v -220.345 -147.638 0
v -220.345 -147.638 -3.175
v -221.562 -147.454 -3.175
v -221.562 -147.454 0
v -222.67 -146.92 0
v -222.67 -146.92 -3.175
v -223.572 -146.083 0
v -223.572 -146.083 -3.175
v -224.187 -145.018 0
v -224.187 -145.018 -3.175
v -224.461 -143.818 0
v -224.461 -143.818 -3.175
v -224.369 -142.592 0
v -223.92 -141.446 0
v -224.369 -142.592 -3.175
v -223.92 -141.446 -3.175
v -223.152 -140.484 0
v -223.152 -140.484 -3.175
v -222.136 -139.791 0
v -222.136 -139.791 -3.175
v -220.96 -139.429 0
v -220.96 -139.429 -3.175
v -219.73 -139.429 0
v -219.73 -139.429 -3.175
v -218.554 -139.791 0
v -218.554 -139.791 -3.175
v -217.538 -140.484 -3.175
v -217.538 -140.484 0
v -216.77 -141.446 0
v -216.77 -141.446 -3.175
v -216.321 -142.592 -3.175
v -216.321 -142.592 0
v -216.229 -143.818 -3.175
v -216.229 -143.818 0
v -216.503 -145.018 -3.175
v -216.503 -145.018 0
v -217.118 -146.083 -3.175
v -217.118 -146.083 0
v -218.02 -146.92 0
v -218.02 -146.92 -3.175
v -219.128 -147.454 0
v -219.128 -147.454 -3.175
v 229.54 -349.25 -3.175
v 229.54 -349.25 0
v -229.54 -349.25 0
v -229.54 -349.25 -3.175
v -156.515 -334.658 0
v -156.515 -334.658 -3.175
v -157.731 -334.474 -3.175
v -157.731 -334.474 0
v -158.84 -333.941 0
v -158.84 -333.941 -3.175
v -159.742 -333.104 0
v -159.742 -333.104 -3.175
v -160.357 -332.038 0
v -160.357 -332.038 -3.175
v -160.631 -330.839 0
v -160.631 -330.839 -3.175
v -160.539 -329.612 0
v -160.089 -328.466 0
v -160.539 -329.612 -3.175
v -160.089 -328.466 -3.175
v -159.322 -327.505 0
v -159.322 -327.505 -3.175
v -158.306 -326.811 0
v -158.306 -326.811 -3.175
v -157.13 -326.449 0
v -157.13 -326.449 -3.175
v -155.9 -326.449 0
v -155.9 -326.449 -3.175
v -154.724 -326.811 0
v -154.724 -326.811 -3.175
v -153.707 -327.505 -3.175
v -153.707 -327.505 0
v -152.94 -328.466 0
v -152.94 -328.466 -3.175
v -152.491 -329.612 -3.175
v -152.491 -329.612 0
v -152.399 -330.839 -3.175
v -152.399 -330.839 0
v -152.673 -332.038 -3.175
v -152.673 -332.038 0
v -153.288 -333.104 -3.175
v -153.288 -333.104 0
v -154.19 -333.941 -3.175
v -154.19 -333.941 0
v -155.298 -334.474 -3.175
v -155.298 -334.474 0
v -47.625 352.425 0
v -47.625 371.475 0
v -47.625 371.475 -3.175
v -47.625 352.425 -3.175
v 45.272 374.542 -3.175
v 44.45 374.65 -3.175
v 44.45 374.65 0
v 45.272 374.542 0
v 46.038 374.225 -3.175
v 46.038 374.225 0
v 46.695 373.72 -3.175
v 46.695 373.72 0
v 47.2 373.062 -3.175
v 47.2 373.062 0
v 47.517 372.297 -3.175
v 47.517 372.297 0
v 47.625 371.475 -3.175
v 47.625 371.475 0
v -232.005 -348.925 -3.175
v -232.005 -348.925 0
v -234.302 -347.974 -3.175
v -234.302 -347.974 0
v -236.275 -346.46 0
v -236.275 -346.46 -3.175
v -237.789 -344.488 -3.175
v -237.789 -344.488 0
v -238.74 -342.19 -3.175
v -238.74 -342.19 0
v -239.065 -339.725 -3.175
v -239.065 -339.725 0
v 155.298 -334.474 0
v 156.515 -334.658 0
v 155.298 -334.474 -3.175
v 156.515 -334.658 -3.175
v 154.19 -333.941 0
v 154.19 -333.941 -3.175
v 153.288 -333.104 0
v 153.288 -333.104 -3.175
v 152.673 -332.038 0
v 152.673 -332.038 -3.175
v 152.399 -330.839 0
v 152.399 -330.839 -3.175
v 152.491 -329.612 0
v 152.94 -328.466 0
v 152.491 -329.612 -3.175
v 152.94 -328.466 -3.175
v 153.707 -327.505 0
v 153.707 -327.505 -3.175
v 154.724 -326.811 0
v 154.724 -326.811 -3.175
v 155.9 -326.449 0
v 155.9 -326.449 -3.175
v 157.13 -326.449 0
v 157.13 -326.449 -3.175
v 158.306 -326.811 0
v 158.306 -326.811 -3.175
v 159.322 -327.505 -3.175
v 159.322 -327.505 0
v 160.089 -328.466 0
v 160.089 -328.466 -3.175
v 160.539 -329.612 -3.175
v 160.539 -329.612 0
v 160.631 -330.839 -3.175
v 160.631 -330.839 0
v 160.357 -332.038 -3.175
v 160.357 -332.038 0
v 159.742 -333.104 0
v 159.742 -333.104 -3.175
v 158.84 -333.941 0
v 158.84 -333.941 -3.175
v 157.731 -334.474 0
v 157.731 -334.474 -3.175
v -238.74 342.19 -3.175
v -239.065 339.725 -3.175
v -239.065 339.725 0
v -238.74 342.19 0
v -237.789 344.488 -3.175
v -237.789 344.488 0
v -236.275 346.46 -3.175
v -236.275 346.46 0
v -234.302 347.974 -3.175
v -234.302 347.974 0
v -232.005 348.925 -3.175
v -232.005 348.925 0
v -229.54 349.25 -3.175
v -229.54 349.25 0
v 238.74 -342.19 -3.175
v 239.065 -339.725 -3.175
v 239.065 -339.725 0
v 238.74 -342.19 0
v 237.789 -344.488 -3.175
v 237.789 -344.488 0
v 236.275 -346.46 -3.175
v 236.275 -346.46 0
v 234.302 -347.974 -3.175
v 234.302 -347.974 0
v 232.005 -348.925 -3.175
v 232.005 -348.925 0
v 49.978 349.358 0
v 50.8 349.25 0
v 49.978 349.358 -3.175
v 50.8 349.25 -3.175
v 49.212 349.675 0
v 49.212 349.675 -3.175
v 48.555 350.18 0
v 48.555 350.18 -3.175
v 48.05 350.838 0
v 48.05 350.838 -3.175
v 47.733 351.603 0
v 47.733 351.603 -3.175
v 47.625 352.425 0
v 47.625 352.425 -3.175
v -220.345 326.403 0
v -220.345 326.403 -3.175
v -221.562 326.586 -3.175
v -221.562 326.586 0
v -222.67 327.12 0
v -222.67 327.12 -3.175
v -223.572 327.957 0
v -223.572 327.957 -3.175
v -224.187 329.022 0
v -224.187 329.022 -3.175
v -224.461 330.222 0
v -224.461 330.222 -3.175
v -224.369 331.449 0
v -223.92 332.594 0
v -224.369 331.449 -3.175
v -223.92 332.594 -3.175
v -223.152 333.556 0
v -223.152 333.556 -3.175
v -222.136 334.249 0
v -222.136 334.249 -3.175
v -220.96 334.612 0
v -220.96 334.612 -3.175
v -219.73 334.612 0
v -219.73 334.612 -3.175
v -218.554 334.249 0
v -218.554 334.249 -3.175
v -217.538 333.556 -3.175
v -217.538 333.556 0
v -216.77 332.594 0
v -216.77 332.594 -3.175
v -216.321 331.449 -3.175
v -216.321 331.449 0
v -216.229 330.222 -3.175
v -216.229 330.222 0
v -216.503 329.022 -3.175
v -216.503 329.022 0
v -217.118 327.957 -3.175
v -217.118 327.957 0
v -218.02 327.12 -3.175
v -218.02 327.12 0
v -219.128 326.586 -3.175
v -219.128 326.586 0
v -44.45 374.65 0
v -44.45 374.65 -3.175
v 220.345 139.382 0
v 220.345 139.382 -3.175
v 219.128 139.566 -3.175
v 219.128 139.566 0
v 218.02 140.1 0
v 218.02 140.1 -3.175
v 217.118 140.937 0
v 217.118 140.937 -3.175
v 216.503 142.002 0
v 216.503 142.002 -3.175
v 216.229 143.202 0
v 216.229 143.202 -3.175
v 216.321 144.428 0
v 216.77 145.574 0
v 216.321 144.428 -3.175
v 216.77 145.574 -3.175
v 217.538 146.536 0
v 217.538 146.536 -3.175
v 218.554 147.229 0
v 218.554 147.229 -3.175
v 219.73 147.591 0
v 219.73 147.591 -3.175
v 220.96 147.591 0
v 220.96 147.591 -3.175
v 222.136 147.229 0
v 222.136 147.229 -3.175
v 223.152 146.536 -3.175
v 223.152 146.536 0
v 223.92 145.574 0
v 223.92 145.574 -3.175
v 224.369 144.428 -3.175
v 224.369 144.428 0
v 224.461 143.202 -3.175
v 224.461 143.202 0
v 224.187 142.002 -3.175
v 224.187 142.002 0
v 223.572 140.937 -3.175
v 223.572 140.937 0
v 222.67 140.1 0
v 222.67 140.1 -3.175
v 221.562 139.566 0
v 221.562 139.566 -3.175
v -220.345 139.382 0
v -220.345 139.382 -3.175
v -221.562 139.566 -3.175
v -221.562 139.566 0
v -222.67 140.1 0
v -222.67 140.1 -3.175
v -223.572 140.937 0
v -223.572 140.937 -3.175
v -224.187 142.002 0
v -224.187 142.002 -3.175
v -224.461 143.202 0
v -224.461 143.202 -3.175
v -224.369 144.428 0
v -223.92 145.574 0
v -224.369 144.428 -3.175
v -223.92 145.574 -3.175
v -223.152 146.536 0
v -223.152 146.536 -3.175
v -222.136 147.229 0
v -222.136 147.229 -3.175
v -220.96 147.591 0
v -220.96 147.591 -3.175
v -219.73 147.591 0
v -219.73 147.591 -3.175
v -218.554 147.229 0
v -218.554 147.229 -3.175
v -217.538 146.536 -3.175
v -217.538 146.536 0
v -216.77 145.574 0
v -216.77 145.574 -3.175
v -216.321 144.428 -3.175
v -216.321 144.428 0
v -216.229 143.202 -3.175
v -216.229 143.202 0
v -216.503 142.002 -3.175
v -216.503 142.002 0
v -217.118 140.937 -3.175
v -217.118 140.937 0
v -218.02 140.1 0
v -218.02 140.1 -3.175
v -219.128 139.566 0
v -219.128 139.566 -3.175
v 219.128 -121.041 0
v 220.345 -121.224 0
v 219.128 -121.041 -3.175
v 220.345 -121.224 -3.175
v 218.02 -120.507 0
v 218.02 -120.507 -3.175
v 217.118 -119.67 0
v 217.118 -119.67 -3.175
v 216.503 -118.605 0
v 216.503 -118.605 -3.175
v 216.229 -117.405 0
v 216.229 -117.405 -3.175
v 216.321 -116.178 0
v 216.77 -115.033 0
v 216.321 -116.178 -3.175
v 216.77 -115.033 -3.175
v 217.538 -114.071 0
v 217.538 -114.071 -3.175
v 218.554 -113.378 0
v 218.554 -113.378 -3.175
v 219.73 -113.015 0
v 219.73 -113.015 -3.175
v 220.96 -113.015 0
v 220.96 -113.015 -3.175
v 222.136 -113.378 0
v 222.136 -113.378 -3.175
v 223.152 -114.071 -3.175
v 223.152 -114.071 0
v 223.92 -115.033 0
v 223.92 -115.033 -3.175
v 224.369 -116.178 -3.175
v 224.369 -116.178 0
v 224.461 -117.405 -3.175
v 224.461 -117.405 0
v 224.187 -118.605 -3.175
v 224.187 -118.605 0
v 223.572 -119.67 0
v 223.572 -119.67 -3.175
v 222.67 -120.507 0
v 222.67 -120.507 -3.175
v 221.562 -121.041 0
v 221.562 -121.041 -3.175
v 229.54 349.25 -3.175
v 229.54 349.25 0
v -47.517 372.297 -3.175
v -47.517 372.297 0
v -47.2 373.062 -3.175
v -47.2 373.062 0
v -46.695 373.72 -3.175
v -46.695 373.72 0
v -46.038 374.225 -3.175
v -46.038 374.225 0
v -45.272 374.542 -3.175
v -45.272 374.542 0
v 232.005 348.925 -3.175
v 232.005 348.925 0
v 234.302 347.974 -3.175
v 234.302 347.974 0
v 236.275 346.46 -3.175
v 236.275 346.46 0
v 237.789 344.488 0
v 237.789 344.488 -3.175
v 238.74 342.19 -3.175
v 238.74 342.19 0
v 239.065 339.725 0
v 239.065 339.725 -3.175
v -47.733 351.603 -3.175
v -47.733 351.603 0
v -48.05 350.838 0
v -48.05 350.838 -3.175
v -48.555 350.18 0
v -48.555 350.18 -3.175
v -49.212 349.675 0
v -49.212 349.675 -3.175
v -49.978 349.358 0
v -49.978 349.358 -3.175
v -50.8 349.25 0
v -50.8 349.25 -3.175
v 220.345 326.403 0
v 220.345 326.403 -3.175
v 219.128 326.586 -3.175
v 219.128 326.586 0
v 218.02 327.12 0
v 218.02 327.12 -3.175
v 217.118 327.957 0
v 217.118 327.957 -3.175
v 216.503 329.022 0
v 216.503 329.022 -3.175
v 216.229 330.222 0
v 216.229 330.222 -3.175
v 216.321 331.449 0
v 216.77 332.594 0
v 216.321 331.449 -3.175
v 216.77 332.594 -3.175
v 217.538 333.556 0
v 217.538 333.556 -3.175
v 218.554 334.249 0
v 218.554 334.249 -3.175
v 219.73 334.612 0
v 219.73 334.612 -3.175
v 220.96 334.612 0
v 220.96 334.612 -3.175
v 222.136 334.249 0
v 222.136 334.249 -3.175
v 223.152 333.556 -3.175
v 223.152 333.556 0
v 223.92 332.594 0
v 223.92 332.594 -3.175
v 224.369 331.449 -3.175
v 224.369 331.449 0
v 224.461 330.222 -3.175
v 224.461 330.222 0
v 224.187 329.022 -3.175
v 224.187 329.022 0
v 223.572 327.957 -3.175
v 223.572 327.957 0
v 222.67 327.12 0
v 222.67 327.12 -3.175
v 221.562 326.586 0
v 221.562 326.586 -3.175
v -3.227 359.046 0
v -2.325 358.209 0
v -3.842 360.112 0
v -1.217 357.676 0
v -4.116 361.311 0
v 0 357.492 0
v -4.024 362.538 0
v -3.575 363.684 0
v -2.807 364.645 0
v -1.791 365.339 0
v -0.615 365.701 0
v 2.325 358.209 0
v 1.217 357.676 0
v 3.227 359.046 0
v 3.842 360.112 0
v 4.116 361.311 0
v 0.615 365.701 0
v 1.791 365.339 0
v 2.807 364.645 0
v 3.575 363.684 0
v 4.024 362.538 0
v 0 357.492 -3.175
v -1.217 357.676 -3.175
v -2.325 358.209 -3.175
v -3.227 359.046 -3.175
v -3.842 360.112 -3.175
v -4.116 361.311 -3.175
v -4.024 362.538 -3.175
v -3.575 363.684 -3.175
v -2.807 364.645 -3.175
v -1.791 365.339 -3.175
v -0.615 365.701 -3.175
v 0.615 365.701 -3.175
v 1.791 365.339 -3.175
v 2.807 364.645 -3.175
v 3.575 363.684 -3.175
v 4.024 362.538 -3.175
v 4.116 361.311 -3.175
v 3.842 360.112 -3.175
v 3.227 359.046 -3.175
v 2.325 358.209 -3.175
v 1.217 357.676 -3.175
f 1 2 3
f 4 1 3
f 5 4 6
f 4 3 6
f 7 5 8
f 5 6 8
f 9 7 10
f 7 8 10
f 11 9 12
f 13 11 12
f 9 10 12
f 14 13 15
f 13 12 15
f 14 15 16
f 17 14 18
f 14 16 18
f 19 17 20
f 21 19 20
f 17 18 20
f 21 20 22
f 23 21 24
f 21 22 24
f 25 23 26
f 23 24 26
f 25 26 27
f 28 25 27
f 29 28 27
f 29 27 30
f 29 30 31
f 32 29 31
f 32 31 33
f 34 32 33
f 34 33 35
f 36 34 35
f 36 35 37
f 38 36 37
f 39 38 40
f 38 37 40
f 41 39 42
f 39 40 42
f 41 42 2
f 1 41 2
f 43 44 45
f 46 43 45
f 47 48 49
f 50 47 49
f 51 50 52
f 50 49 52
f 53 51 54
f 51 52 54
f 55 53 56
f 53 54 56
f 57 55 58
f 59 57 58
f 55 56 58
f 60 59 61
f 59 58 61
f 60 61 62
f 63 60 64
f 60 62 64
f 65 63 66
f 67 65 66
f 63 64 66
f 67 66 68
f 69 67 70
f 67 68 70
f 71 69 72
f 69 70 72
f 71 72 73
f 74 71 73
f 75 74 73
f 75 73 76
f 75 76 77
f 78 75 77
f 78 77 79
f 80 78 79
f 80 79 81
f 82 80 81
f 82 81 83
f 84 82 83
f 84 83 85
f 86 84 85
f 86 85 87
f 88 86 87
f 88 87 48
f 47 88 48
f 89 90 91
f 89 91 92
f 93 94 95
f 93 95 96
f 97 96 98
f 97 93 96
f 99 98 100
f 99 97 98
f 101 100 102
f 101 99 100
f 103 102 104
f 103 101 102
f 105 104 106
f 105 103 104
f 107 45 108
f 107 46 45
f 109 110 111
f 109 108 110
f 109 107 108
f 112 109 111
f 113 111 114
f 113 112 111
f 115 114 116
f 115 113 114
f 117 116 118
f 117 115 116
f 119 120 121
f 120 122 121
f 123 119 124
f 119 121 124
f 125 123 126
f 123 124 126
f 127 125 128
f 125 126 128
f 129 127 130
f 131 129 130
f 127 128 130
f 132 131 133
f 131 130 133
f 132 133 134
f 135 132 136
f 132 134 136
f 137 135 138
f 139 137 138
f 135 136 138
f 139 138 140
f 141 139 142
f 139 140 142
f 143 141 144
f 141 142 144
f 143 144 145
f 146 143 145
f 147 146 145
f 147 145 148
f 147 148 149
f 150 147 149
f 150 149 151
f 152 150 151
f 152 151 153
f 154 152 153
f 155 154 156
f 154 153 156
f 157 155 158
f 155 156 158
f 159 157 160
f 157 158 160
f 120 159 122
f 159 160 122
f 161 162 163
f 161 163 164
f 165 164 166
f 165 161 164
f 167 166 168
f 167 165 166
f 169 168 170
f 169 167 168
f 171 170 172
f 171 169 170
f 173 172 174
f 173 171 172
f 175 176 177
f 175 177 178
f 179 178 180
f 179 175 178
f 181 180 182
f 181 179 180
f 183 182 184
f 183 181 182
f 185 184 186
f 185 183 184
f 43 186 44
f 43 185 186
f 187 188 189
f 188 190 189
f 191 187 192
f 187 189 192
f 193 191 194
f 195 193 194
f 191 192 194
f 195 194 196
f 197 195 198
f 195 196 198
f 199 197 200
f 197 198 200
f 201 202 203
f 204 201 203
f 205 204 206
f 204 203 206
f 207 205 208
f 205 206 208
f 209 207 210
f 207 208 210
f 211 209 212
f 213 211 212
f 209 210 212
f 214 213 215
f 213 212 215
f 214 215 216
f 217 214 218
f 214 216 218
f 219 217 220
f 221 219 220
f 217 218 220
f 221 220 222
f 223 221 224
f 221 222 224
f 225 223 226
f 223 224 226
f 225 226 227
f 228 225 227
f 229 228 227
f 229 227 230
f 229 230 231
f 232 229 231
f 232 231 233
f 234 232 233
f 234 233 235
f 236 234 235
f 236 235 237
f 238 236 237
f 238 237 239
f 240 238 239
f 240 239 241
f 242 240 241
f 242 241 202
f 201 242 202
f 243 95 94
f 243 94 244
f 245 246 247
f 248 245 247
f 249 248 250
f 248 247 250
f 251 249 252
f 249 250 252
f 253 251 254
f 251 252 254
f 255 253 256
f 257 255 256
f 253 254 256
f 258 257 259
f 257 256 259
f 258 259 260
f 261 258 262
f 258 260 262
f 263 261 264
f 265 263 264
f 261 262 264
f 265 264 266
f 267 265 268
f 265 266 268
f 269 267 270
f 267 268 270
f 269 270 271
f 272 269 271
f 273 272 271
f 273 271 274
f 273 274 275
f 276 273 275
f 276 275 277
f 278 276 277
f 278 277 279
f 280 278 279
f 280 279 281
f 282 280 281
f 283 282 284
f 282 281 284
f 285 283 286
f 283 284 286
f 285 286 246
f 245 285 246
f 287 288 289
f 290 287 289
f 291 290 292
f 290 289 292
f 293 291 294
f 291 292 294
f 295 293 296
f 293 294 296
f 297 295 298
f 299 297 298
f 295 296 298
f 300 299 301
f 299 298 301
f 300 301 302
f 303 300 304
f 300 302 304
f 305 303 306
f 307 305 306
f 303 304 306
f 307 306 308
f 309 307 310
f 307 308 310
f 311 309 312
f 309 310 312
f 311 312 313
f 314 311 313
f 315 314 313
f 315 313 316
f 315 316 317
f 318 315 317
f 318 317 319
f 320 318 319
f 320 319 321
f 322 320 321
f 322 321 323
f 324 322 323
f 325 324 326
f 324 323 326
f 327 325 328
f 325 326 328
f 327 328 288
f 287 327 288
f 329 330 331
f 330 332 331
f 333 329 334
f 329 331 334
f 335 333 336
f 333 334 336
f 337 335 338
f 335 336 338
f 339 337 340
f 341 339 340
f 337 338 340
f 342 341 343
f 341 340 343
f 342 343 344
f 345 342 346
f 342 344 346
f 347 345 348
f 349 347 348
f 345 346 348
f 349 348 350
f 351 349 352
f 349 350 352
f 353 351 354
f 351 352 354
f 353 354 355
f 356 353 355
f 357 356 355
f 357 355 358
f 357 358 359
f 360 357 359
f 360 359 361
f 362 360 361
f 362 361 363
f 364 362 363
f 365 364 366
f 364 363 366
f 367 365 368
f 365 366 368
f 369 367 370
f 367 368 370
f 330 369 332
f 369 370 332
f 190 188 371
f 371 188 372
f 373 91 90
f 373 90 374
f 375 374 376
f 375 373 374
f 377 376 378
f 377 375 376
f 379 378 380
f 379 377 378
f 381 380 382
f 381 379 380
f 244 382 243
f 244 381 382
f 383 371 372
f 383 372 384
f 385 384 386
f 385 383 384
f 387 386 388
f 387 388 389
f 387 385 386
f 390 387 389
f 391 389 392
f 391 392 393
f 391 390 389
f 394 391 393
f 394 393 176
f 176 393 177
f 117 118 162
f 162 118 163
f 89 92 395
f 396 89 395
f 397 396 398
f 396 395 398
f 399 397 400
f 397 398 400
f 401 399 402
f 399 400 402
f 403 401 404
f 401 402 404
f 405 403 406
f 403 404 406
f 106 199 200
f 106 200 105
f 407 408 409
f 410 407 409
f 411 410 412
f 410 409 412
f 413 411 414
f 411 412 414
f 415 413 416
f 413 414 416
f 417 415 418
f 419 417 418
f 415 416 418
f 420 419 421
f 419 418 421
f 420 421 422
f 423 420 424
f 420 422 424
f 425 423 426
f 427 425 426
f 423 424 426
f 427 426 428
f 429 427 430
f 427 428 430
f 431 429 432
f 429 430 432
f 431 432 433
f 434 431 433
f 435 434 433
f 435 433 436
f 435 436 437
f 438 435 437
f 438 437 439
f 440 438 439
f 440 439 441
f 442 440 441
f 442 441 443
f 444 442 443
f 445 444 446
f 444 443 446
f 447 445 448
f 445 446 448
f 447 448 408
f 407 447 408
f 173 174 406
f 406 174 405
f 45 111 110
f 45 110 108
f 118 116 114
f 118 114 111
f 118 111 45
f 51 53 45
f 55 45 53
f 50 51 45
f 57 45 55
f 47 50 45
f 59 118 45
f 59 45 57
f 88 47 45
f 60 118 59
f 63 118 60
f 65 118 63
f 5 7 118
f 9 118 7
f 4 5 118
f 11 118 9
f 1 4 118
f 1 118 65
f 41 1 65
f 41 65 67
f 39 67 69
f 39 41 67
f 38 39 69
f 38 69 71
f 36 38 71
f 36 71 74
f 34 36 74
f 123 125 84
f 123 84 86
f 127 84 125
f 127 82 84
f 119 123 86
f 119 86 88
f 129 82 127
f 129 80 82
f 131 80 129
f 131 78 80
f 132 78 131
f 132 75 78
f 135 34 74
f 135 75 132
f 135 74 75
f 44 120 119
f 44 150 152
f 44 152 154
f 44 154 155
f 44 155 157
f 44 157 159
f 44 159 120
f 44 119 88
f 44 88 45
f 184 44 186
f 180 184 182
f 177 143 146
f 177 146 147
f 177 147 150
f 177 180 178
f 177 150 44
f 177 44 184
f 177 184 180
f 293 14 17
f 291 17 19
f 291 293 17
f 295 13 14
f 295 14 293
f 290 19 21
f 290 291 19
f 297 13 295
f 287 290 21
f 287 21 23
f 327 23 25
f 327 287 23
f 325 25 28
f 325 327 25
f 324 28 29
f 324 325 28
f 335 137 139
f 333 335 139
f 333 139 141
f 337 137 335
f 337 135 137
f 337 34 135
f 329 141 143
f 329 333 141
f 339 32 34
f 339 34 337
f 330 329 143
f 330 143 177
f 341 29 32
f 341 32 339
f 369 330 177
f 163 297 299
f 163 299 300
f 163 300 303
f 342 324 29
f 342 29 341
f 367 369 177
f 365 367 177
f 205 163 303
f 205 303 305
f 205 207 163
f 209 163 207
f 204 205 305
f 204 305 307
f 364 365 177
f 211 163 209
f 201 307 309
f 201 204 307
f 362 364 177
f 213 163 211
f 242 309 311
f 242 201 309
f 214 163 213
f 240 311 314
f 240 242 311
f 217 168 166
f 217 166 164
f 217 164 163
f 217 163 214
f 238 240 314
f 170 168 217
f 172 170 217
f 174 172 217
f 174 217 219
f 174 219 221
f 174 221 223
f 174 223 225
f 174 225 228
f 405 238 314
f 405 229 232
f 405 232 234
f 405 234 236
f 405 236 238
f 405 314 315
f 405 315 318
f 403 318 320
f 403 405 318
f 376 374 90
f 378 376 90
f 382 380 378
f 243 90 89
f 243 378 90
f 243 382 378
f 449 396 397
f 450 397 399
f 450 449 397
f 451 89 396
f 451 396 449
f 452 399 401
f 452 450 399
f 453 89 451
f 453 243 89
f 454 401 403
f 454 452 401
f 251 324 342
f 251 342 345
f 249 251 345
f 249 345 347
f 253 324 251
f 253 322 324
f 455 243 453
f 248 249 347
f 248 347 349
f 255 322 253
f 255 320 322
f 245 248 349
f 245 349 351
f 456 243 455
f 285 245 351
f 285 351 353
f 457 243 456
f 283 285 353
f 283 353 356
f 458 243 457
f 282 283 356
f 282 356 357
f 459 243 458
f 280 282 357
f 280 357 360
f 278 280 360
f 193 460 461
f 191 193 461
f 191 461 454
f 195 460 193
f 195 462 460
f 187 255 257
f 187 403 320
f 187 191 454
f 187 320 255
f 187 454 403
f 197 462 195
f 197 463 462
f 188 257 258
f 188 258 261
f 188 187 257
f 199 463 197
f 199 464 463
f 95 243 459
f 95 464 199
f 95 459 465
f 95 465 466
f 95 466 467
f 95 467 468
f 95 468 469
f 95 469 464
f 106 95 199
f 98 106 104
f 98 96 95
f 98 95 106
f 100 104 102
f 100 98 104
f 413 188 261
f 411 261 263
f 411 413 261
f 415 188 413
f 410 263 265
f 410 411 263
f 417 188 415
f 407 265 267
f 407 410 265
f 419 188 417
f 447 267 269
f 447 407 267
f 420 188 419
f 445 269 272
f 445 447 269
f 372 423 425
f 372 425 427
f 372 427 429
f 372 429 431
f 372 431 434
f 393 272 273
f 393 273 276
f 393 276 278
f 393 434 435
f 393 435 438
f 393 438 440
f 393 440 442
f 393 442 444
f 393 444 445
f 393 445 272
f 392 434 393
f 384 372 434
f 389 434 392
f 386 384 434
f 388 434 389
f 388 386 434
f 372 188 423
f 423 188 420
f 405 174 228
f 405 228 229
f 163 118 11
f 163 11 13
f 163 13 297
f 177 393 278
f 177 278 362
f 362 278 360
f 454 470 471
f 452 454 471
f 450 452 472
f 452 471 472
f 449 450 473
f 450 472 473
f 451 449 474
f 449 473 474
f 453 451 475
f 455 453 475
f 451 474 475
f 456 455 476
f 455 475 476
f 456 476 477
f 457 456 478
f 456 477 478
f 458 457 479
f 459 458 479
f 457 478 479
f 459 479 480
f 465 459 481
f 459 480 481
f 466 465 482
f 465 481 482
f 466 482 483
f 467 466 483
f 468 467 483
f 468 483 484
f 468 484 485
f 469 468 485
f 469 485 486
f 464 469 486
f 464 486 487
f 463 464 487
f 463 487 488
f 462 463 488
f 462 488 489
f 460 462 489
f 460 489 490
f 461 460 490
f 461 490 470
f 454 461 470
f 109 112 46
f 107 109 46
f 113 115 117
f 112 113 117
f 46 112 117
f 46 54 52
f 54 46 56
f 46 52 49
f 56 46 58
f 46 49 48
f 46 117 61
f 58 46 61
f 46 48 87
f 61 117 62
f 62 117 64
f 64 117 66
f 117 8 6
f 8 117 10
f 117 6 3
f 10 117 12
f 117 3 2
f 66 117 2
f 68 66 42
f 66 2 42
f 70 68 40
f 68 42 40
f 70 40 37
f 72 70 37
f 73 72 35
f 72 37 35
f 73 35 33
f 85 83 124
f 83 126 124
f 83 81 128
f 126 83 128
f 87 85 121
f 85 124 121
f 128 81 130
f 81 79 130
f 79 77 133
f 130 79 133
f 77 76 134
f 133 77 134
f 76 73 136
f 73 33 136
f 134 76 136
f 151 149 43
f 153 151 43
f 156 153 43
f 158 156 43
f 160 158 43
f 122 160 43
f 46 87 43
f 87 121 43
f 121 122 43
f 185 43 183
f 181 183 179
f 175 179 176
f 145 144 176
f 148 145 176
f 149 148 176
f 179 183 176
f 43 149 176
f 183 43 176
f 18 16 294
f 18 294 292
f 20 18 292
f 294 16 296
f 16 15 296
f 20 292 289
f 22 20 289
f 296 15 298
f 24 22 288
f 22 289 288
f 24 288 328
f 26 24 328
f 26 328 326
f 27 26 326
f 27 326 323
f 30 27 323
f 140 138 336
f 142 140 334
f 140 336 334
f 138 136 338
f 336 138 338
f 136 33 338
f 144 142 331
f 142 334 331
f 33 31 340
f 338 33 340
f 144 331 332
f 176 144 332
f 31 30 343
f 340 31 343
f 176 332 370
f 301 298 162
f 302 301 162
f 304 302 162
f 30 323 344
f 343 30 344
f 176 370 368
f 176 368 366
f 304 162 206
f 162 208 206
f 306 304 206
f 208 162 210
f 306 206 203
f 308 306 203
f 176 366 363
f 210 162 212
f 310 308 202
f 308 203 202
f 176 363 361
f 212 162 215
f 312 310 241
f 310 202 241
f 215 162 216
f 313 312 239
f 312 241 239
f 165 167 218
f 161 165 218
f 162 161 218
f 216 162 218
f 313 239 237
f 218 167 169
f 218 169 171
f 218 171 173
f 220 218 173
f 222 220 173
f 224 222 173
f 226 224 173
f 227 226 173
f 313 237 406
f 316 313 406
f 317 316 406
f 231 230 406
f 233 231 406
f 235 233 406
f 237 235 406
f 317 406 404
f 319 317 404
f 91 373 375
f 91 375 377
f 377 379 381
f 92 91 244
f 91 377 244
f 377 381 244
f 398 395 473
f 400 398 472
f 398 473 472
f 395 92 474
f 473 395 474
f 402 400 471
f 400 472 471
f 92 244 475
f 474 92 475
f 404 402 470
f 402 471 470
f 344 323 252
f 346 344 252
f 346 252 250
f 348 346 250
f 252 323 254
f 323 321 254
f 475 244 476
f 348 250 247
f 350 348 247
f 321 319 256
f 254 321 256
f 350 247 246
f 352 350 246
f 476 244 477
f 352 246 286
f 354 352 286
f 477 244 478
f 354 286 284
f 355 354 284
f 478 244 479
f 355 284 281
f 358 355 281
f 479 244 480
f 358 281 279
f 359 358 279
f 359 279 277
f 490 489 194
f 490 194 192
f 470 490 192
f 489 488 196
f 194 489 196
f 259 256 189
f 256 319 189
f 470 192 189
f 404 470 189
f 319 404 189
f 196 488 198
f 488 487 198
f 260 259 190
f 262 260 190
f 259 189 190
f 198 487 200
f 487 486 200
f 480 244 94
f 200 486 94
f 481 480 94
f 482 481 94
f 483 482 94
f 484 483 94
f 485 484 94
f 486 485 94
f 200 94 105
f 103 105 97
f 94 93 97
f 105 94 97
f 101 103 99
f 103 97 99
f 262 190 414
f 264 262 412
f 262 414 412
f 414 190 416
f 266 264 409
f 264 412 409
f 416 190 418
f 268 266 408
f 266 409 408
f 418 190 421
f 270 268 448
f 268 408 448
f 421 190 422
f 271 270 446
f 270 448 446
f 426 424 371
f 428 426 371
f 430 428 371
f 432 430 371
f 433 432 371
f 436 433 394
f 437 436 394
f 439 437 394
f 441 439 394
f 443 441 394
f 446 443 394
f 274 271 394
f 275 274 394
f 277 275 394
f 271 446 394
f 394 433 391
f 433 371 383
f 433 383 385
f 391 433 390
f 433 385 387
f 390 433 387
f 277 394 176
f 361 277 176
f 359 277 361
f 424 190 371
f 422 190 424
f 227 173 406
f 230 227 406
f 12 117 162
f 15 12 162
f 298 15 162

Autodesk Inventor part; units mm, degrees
ref_plane "YZ Plane" through (0, 0, 0) normal (1, 0, 0) x (0, 1, 0)
ref_plane "XZ Plane" through (0, 0, 0) normal (0, 1, 0) x (-1, 0, 0)
ref_plane "XY Plane" through (0, 0, 0) normal (0, 0, 1) x (1, 0, 0)
sketch "Sketch1" plane through (0, 0, 0) normal (0, 0, 1) x (1, 0, 0)
  line L0 (0, 519.43) -> (0, -494.03) projected
  line L1 (-334.6907, 0) -> (334.6907, 0) projected
  line L2 (239.0648, -349.25) -> (-239.0648, -349.25)
  line L3 (-239.0648, -349.25) -> (-239.0648, 349.25)
  line L4 (-239.0648, 349.25) -> (239.0648, 349.25)
  line L5 (239.0648, 349.25) -> (239.0648, -349.25)
  line L6 (239.0648, -349.25) -> (-239.0648, 349.25) construction
  line L7 (-239.0648, -349.25) -> (239.0648, 349.25) construction
  line L8 (220.345, -330.5302) -> (-220.345, -330.5302) construction
  line L9 (-220.345, -330.5302) -> (-220.345, 330.5302) construction
  line L10 (-220.345, 330.5302) -> (220.345, 330.5302) construction
  line L11 (220.345, 330.5302) -> (220.345, -330.5302) construction
  line L12 (220.345, -330.5302) -> (-220.345, 330.5302) construction
  line L13 (-220.345, -330.5302) -> (220.345, 330.5302) construction
  line L14 (47.625, 374.65) -> (-47.625, 374.65)
  line L15 (-47.625, 374.65) -> (-47.625, 349.25)
  line L16 (-47.625, 349.25) -> (47.625, 349.25)
  line L17 (47.625, 349.25) -> (47.625, 374.65)
  line L18 (47.625, 374.65) -> (-47.625, 349.25) construction
  line L19 (-47.625, 374.65) -> (47.625, 349.25) construction
  point P0 (0, 0)
  point P1 (-156.5148, 330.5302)
  point P2 (0, 330.5302)
  point P3 (156.5148, 330.5302)
  point P4 (-156.5148, -330.5302)
  point P5 (0, -330.5302)
  point P6 (156.5148, -330.5302)
  point P7 (-220.345, 143.51)
  point P8 (-220.345, -143.51)
  point P9 (220.345, 143.51)
  point P10 (220.345, -117.0967)
  point P11 (-220.345, 0)
  point P12 (0, 361.95)
  point P13 (0, 361.6198)
  dimension "d0" = 478.1296
  dimension "d1" = 698.5
  dimension "d3" = 18.7198
  dimension "d4" = 18.7198
  dimension "d7" = 143.51
  dimension "d8" = 143.51
  dimension "d10" = 205.74
  dimension "d20" = 82.55
  dimension "d21" = 82.55
  dimension "d23" = 95.25
  dimension "d24" = 25.4
  dimension "d27" = 12.3698
extrude "Extrusion1" add sketch "Sketch1" against normal blind 3.175
hole "Hole1" at (-156.5148, -330.5302, 0) at (156.5148, -330.5302, 0) at (220.345, 143.51, 0) at (220.345, -117.0967, 0) at (-220.345, 143.51, 0) at (-220.345, -143.51, 0) at (-220.345, 330.5302, 0) at (220.345, 330.5302, 0) at (0, 361.6198, 0) direction (0, 0, -1) diameter 8.255 end through all
fillet "Fillet1" radius 9.525 4 edges at (-239.0648, 349.25, -1.5875) (239.0648, 349.25, -1.5875) (239.0648, -349.25, -1.5875) (-239.0648, -349.25, -1.5875)
fillet "Fillet2" radius 3.175 4 edges at (47.625, 374.65, -1.5875) (47.625, 349.25, -1.5875) (-47.625, 374.65, -1.5875) (-47.625, 349.25, -1.5875)
properties material "ALUMINUM, 6061-T651"
